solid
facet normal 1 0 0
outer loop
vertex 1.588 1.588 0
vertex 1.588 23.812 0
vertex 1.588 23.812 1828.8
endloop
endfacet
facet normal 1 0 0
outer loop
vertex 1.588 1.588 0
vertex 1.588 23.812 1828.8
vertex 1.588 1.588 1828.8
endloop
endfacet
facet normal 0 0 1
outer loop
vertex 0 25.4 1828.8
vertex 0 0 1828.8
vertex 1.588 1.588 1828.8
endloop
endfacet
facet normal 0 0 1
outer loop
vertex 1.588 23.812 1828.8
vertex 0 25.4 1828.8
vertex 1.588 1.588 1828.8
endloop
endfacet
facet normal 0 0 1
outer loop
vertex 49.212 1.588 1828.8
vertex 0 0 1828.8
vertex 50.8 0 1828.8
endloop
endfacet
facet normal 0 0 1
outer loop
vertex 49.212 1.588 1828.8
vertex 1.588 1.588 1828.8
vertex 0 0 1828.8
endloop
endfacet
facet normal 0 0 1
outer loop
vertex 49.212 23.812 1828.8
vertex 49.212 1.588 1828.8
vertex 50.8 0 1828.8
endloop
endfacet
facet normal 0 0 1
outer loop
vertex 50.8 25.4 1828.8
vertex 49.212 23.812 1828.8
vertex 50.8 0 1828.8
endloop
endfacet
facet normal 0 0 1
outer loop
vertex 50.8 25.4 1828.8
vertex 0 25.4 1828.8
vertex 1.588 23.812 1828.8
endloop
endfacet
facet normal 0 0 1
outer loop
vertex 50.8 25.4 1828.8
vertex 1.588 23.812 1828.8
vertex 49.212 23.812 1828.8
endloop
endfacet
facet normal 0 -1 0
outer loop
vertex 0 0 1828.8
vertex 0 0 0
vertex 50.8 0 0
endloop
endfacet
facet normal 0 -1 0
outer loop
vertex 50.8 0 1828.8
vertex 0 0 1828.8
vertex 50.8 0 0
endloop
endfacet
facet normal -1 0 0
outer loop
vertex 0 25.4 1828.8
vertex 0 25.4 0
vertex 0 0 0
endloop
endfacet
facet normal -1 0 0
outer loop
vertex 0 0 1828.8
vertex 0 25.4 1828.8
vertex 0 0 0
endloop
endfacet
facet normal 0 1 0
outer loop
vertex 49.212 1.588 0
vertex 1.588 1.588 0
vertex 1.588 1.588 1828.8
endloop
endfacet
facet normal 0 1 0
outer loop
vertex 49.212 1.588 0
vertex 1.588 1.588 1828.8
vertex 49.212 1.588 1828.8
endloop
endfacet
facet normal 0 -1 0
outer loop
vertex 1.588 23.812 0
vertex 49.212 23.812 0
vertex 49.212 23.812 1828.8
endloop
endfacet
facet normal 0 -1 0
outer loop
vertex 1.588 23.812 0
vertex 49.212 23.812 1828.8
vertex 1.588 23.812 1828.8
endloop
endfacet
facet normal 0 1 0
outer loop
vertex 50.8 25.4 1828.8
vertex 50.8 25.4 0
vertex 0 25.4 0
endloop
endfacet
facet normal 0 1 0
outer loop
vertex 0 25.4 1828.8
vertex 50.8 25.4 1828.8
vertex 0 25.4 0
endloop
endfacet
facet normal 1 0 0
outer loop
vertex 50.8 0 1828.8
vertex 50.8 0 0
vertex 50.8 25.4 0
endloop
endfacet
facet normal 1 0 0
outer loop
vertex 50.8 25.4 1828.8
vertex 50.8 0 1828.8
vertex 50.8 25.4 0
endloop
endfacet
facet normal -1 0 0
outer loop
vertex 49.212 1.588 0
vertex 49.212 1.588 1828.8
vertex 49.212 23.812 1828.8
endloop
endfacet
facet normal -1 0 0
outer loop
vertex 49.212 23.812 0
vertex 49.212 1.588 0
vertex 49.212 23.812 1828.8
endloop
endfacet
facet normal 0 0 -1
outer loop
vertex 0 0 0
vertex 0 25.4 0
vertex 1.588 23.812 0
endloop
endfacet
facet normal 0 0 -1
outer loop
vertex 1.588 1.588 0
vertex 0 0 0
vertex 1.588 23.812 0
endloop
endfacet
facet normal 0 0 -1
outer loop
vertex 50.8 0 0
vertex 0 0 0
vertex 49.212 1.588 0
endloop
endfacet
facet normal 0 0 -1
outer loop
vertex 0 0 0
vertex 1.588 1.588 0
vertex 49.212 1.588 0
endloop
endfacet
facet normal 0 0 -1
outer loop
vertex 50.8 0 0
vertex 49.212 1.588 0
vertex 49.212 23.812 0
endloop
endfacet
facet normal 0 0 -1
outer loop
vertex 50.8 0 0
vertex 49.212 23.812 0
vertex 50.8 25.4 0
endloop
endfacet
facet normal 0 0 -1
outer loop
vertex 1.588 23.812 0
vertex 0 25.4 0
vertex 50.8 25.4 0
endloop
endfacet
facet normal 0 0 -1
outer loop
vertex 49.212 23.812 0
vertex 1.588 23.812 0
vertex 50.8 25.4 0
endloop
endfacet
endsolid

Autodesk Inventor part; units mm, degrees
ref_plane "YZ Plane" through (0, 0, 0) normal (1, 0, 0) x (0, 1, 0)
ref_plane "XZ Plane" through (0, 0, 0) normal (0, 1, 0) x (-1, 0, 0)
ref_plane "XY Plane" through (0, 0, 0) normal (0, 0, 1) x (1, 0, 0)
sketch "Sketch1" plane through (0, 0, 0) normal (0, 0, 1) x (1, 0, 0)
  line L0 (0, 0) -> (50.8, 0)
  line L1 (50.8, 0) -> (50.8, 25.4)
  line L2 (50.8, 25.4) -> (0, 25.4)
  line L3 (0, 25.4) -> (0, 0)
  dimension "d0" = 50.8
  dimension "d1" = 25.4
extrude "Extrusion1" add sketch "Sketch1" along normal blind 1828.8
shell "Shell1" thickness 1.5875 removed faces 2 at (16.9333, 8.4667, 0) at (16.9333, 8.4667, 1828.8)
equation "\"d2\" = Length"
equation "\"Length\" = 1828.8"
properties part number "Box Tube"
